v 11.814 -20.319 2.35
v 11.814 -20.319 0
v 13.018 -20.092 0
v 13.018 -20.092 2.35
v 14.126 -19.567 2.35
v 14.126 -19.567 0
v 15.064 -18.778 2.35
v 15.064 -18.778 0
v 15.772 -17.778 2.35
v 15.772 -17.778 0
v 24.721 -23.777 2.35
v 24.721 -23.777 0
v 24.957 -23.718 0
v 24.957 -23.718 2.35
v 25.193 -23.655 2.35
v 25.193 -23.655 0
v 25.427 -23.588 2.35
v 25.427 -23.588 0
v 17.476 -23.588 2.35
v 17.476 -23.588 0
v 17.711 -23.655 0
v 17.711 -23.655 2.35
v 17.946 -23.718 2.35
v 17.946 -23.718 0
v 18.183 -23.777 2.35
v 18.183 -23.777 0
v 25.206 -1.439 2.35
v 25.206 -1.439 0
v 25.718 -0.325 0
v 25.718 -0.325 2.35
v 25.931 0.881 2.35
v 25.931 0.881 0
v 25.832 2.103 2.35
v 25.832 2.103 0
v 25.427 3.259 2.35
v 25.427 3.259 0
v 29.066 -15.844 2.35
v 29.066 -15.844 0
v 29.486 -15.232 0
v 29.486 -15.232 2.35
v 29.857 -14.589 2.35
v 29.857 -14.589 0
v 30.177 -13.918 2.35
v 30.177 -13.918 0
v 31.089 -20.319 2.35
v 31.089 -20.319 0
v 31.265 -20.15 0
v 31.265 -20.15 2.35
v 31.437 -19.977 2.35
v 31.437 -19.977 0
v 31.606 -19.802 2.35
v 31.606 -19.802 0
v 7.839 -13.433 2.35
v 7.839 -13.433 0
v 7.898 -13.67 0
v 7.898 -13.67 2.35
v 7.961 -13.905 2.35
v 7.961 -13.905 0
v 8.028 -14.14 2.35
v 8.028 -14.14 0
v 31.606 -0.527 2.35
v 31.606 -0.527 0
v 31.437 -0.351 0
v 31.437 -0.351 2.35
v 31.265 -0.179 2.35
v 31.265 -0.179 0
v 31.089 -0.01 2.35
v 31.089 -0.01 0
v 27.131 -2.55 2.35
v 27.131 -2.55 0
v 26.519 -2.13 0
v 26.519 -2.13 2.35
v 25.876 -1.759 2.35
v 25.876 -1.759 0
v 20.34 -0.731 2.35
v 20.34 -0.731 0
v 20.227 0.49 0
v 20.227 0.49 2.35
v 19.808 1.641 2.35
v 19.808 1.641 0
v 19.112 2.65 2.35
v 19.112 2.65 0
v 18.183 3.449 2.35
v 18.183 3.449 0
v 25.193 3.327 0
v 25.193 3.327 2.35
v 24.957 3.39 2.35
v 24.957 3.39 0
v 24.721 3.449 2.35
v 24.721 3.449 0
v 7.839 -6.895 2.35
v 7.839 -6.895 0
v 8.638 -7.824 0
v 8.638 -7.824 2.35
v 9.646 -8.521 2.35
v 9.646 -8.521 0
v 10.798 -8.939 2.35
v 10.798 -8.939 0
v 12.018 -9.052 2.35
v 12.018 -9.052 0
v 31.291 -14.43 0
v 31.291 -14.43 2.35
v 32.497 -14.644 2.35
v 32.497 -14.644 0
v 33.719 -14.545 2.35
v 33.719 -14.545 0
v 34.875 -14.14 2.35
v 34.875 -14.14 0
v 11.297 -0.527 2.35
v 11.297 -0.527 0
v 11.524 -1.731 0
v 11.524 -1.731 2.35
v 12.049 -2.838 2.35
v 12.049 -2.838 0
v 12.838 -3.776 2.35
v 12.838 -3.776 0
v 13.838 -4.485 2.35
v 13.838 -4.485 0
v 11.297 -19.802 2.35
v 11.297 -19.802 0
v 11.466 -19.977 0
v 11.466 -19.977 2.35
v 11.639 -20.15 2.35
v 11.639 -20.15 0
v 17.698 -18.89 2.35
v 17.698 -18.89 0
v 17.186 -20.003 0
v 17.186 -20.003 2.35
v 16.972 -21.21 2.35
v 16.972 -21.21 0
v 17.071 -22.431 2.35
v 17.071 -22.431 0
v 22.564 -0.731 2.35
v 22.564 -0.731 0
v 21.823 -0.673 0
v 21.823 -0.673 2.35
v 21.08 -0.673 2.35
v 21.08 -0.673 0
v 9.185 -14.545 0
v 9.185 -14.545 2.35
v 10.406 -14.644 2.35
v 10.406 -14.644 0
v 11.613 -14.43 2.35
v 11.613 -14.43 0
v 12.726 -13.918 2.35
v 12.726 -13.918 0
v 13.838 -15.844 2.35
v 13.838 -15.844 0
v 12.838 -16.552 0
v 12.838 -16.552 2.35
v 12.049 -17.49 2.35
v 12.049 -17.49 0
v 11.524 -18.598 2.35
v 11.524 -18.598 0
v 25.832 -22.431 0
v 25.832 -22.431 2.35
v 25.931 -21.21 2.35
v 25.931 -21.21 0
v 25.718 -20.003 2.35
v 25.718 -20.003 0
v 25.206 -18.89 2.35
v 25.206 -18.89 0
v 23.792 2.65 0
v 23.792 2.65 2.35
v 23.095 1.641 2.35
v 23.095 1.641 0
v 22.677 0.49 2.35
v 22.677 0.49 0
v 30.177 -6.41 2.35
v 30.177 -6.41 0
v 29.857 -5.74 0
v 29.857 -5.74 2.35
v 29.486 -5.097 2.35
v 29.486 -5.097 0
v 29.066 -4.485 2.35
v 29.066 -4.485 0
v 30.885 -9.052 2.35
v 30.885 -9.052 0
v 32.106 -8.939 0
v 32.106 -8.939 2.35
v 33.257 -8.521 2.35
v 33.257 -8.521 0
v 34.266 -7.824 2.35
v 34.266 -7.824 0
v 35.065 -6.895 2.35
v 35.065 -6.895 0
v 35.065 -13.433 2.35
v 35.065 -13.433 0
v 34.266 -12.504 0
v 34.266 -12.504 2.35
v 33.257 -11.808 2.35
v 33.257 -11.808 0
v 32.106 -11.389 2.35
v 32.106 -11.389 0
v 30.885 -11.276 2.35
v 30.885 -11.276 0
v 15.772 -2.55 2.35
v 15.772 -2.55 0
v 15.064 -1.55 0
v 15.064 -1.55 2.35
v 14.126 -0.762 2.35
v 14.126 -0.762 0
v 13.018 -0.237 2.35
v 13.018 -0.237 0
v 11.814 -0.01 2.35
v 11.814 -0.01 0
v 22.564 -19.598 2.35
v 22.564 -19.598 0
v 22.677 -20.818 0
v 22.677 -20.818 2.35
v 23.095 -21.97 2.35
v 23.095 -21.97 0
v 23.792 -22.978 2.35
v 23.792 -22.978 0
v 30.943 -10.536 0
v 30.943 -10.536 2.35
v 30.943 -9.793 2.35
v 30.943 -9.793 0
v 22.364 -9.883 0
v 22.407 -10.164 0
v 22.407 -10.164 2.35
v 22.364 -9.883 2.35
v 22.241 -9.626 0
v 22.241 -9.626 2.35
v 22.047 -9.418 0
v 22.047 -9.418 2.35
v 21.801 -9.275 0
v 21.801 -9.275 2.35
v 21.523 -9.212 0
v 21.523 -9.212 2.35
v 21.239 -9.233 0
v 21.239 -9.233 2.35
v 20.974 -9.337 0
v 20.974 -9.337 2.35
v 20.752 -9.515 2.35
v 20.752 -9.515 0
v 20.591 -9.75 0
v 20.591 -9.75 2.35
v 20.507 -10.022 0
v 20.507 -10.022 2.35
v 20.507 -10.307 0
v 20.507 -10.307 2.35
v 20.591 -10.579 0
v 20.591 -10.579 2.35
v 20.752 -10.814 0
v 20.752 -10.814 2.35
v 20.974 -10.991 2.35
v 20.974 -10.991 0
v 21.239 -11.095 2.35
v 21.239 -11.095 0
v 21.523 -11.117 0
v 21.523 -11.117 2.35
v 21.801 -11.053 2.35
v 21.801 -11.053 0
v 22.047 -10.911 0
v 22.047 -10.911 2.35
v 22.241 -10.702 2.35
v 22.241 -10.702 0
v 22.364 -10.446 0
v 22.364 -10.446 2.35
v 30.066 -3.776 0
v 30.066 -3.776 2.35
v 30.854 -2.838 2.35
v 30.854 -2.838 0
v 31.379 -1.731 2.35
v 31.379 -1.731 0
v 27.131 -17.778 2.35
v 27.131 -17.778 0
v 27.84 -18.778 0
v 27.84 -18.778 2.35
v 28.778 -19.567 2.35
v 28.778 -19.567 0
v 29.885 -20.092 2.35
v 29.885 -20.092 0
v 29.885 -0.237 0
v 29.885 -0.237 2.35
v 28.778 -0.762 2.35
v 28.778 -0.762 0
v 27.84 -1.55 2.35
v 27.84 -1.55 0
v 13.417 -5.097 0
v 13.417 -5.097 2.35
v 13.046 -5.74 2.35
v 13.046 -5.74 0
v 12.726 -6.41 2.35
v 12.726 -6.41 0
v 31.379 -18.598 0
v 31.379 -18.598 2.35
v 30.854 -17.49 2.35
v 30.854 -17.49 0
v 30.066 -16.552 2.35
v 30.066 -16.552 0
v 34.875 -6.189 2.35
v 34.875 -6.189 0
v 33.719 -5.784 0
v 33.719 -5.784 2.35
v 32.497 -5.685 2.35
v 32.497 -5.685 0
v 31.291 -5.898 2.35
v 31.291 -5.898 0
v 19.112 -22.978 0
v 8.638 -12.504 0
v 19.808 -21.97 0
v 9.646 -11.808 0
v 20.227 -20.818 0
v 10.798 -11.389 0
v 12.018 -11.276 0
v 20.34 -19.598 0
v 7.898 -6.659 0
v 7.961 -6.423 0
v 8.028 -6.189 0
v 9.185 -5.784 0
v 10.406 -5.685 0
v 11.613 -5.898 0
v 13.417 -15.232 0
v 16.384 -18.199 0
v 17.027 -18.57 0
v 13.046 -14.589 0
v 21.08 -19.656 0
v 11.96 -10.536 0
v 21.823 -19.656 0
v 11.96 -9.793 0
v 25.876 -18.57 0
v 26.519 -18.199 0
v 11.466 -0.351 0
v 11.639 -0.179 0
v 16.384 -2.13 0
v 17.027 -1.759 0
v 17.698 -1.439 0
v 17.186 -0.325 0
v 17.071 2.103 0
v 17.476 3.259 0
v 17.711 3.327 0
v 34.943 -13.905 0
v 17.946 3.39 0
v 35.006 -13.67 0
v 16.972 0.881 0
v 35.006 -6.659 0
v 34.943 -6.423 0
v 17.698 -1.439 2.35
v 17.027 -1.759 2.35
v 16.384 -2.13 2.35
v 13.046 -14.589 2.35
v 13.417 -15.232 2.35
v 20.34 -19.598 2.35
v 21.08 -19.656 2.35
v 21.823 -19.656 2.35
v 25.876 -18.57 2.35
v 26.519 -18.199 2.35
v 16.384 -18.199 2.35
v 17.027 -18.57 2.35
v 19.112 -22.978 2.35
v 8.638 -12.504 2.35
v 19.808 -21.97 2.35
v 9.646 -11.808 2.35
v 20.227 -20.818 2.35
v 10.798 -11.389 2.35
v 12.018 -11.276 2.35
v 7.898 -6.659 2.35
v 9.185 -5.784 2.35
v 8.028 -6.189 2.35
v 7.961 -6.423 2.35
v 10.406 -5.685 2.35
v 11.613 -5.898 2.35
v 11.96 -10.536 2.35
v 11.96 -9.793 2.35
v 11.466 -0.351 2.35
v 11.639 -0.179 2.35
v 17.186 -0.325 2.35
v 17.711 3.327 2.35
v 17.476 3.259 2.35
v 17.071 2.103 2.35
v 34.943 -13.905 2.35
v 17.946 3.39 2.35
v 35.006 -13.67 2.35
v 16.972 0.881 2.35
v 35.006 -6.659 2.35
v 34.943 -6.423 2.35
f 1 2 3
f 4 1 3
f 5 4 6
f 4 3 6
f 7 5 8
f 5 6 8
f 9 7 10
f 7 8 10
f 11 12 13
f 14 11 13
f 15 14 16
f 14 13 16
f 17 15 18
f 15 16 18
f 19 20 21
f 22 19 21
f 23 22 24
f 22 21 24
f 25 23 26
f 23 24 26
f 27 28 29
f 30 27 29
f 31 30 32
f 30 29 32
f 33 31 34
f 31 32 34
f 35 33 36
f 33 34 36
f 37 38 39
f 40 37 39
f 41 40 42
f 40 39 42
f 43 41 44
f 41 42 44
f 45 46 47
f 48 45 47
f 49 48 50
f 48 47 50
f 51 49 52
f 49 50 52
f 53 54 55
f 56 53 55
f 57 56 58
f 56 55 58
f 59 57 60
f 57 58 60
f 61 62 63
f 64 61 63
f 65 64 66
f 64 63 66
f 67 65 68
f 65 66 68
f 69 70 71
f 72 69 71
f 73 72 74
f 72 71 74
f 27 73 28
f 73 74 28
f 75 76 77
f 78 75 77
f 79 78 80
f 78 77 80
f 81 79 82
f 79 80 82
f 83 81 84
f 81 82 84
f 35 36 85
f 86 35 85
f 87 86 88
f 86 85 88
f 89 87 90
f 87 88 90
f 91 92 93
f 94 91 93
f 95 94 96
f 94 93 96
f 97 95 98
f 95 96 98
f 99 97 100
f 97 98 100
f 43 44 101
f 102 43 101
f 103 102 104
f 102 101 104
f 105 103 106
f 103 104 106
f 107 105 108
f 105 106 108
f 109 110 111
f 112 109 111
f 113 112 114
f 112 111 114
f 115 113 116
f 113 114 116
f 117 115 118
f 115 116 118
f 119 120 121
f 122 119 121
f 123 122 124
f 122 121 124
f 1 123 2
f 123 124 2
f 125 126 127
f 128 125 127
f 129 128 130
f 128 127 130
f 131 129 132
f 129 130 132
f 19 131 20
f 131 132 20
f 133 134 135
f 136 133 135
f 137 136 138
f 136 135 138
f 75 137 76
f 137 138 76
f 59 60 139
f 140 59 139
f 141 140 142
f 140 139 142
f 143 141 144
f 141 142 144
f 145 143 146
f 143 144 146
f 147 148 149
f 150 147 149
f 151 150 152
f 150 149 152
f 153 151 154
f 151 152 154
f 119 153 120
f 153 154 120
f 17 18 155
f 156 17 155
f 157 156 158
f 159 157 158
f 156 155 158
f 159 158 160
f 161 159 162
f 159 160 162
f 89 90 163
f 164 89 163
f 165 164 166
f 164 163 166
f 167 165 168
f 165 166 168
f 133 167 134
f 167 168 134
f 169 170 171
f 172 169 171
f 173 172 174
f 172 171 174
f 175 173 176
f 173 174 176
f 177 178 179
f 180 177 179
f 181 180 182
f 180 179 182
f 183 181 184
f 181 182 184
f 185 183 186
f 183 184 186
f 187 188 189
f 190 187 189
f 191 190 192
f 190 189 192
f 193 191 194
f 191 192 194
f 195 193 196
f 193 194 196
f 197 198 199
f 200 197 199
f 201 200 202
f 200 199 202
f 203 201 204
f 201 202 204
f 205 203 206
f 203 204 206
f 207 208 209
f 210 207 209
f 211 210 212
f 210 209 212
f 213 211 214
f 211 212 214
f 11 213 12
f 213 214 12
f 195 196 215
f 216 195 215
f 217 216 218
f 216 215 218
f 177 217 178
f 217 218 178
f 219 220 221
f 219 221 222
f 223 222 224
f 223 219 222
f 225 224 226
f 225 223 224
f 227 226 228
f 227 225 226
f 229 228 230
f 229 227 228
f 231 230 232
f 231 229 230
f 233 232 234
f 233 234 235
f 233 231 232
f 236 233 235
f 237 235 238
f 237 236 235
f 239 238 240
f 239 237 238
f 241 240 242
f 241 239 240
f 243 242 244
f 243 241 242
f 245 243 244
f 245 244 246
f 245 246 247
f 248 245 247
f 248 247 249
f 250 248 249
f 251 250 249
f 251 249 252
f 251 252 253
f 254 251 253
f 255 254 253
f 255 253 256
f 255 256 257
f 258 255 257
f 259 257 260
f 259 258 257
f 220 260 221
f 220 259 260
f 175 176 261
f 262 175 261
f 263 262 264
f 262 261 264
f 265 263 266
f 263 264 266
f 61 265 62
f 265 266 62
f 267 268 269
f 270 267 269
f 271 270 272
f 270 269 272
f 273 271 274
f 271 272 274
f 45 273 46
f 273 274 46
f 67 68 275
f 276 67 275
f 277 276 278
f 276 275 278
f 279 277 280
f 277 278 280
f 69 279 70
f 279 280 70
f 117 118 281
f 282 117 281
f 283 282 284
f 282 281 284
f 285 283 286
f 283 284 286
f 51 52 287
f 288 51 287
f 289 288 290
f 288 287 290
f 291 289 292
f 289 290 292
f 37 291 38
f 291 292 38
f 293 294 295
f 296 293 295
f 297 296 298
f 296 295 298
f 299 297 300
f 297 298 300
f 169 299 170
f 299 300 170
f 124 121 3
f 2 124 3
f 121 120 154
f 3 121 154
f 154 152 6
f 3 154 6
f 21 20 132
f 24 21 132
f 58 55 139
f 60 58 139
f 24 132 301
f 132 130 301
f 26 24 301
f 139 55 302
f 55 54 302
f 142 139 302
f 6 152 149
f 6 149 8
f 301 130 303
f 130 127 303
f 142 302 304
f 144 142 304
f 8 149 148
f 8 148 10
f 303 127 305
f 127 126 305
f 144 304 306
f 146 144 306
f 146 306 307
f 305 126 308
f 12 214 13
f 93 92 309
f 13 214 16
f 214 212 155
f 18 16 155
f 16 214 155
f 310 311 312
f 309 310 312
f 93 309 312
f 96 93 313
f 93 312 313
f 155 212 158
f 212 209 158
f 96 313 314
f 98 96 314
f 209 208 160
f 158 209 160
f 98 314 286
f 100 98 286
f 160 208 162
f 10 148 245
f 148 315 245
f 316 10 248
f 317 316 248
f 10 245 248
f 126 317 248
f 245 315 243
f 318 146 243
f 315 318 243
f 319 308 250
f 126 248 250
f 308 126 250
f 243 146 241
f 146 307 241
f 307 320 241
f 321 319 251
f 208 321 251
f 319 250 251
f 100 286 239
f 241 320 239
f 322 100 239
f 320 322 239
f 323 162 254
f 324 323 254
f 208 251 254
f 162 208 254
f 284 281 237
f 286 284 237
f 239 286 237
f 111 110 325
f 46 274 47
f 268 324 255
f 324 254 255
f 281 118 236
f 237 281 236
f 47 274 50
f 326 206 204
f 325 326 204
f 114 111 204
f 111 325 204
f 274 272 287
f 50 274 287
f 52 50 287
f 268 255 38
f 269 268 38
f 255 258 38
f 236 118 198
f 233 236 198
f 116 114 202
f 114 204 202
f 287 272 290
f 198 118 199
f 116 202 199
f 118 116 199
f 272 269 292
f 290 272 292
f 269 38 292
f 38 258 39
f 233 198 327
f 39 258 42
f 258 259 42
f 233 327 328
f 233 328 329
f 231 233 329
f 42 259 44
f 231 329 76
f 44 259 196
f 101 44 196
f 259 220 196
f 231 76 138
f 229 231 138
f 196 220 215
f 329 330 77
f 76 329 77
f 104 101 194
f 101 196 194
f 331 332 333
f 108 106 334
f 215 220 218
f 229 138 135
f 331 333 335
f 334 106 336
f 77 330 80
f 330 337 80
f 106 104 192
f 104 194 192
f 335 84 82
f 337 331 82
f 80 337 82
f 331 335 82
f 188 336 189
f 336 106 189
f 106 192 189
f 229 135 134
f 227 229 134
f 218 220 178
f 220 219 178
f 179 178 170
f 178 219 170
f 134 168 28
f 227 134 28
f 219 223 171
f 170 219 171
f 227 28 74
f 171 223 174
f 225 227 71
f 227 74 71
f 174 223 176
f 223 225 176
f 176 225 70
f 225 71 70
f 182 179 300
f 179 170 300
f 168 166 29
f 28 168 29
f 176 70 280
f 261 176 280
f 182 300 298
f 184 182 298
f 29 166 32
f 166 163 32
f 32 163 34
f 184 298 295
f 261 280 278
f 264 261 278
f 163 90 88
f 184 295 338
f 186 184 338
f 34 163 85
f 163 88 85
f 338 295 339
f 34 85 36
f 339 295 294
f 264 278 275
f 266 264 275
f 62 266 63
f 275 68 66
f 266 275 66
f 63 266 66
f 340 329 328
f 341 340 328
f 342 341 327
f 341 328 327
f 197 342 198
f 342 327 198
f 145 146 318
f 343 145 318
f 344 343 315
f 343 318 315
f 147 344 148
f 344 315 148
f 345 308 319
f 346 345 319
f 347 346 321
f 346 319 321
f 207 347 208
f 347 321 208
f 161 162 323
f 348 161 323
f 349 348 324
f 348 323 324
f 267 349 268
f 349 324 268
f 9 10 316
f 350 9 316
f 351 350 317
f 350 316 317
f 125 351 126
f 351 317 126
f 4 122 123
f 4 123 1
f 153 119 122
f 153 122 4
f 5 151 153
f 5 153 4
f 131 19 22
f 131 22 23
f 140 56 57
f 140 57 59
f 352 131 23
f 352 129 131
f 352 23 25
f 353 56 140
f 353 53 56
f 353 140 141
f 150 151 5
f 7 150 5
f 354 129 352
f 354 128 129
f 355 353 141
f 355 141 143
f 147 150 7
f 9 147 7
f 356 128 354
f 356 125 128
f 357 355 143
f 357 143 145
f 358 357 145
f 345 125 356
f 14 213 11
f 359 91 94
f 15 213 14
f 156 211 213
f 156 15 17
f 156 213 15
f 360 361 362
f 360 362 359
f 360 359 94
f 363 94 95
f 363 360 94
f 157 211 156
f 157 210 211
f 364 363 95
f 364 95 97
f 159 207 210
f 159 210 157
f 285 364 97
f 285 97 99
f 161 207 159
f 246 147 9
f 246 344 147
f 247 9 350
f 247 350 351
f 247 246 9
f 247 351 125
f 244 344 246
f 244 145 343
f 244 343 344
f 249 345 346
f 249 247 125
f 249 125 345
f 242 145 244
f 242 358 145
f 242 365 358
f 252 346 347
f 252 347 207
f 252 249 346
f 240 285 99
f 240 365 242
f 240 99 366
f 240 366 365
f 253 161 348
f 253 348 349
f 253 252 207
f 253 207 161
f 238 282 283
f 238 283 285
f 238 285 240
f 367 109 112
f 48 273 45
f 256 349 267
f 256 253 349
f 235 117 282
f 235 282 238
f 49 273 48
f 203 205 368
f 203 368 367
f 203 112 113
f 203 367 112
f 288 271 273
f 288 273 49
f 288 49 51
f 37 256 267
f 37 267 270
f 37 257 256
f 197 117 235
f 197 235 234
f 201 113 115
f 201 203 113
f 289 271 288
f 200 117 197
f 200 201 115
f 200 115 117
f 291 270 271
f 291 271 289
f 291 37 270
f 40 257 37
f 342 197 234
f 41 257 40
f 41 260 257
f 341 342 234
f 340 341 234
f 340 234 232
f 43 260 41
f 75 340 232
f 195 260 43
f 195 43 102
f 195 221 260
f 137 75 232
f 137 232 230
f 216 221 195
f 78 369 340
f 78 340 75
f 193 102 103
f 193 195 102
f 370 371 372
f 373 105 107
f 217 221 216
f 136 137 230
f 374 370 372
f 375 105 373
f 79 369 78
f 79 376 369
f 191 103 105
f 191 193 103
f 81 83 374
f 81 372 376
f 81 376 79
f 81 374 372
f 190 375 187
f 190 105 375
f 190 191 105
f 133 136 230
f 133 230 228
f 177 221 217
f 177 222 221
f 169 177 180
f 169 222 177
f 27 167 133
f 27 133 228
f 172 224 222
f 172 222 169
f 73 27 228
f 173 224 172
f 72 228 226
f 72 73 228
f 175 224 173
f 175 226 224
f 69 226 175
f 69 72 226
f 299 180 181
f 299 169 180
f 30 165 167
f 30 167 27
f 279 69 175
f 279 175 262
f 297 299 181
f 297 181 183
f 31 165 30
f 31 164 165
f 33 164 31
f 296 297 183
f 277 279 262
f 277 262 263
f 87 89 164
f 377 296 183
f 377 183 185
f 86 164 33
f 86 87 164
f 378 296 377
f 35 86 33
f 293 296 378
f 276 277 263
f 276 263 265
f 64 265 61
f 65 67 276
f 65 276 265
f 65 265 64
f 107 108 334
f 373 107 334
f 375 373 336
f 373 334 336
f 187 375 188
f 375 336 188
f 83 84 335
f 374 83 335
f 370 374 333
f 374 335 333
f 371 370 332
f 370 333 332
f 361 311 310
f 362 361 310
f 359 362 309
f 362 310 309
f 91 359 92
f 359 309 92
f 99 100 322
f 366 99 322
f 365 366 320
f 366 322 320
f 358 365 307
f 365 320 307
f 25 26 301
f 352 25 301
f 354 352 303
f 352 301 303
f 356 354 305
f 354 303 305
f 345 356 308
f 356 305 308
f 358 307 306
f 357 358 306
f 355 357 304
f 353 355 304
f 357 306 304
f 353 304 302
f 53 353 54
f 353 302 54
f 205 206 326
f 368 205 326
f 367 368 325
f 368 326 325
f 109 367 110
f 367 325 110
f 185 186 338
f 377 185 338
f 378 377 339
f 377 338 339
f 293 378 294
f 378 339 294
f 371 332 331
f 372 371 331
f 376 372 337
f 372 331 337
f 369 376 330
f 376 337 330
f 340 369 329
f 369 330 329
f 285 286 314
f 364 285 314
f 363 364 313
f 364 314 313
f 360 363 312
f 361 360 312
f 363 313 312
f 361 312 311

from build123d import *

# Parameters (mm, degrees)
SKETCH1_R           = 0.955
BOSS_EXTRUDE1_DEPTH = 2.35


with BuildPart() as part:
    # Sketch1 → Boss-Extrude1 (new body)
    with BuildSketch(Plane.XY):
        with BuildLine():
            ThreePointArc((31.089190509, -0.00961289), (28.777823425, -0.762116774), (27.131493603, -2.550489779))
            ThreePointArc((27.131493603, -2.550489779), (26.201203233, -1.937982234), (25.205610954, -1.438580913))
            ThreePointArc((25.205610954, -1.438580913), (25.931222497, 0.881369039), (25.427226435, 3.259323592))
            ThreePointArc((25.427226435, 3.259323592), (25.075169864, 3.358604023), (24.720639715, 3.448652933))
            ThreePointArc((24.720639715, 3.448652933), (23.095189045, 1.641281911), (22.563612099, -0.730659454))
            ThreePointArc((22.563612099, -0.730659454), (21.451703233, -0.665357545), (20.339794367, -0.730659454))
            ThreePointArc((20.339794367, -0.730659454), (19.80821742, 1.641281911), (18.182766751, 3.448652933))
            ThreePointArc((18.182766751, 3.448652933), (17.828236601, 3.358604023), (17.47618003, 3.259323592))
            ThreePointArc((17.47618003, 3.259323592), (16.972183969, 0.881369039), (17.697795512, -1.438580913))
            ThreePointArc((17.697795512, -1.438580913), (16.702203233, -1.937982234), (15.771912863, -2.550489779))
            ThreePointArc((15.771912863, -2.550489779), (14.12558304, -0.762116774), (11.814215957, -0.00961289))
            ThreePointArc((11.814215957, -0.00961289), (11.552208296, -0.264862608), (11.296958578, -0.526870269))
            ThreePointArc((11.296958578, -0.526870269), (12.049462462, -2.838237352), (13.837835467, -4.484567174))
            ThreePointArc((13.837835467, -4.484567174), (13.225327922, -5.414857545), (12.725926601, -6.410449824))
            ThreePointArc((12.725926601, -6.410449824), (10.40597665, -5.684838281), (8.028022096, -6.188834342))
            ThreePointArc((8.028022096, -6.188834342), (7.928741665, -6.540890913), (7.838692755, -6.895421063))
            ThreePointArc((7.838692755, -6.895421063), (9.646063777, -8.520871732), (12.018005142, -9.052448679))
            ThreePointArc((12.018005142, -9.052448679), (11.952703233, -10.164357545), (12.018005142, -11.276266411))
            ThreePointArc((12.018005142, -11.276266411), (9.646063777, -11.807843357), (7.838692755, -13.433294027))
            ThreePointArc((7.838692755, -13.433294027), (7.928741665, -13.787824176), (8.028022096, -14.139880747))
            ThreePointArc((8.028022096, -14.139880747), (10.40597665, -14.643876808), (12.725926601, -13.918265265))
            ThreePointArc((12.725926601, -13.918265265), (13.225327922, -14.913857545), (13.837835467, -15.844147915))
            ThreePointArc((13.837835467, -15.844147915), (12.049462462, -17.490477737), (11.296958578, -19.80184482))
            ThreePointArc((11.296958578, -19.80184482), (11.552208296, -20.063852481), (11.814215957, -20.3191022))
            ThreePointArc((11.814215957, -20.3191022), (14.12558304, -19.566598315), (15.771912863, -17.77822531))
            ThreePointArc((15.771912863, -17.77822531), (16.702203233, -18.390732855), (17.697795512, -18.890134176))
            ThreePointArc((17.697795512, -18.890134176), (16.972183969, -21.210084128), (17.47618003, -23.588038682))
            ThreePointArc((17.47618003, -23.588038682), (17.828236601, -23.687319113), (18.182766751, -23.777368023))
            ThreePointArc((18.182766751, -23.777368023), (19.80821742, -21.969997001), (20.339794367, -19.598055636))
            ThreePointArc((20.339794367, -19.598055636), (21.451703233, -19.663357545), (22.563612099, -19.598055636))
            ThreePointArc((22.563612099, -19.598055636), (23.095189045, -21.969997001), (24.720639715, -23.777368023))
            ThreePointArc((24.720639715, -23.777368023), (25.075169864, -23.687319113), (25.427226435, -23.588038682))
            ThreePointArc((25.427226435, -23.588038682), (25.931222497, -21.210084128), (25.205610954, -18.890134176))
            ThreePointArc((25.205610954, -18.890134176), (26.201203233, -18.390732855), (27.131493603, -17.77822531))
            ThreePointArc((27.131493603, -17.77822531), (28.777823425, -19.566598315), (31.089190509, -20.3191022))
            ThreePointArc((31.089190509, -20.3191022), (31.351198169, -20.063852481), (31.606447888, -19.80184482))
            ThreePointArc((31.606447888, -19.80184482), (30.853944004, -17.490477737), (29.065570998, -15.844147915))
            ThreePointArc((29.065570998, -15.844147915), (29.678078543, -14.913857545), (30.177479864, -13.918265265))
            ThreePointArc((30.177479864, -13.918265265), (32.497429816, -14.643876808), (34.87538437, -14.139880747))
            ThreePointArc((34.87538437, -14.139880747), (34.974664801, -13.787824176), (35.064713711, -13.433294027))
            ThreePointArc((35.064713711, -13.433294027), (33.257342689, -11.807843357), (30.885401324, -11.276266411))
            ThreePointArc((30.885401324, -11.276266411), (30.950703233, -10.164357545), (30.885401324, -9.052448679))
            ThreePointArc((30.885401324, -9.052448679), (33.257342689, -8.520871732), (35.064713711, -6.895421063))
            ThreePointArc((35.064713711, -6.895421063), (34.974664801, -6.540890913), (34.87538437, -6.188834342))
            ThreePointArc((34.87538437, -6.188834342), (32.497429816, -5.684838281), (30.177479864, -6.410449824))
            ThreePointArc((30.177479864, -6.410449824), (29.678078543, -5.414857545), (29.065570998, -4.484567174))
            ThreePointArc((29.065570998, -4.484567174), (30.853944004, -2.838237352), (31.606447888, -0.526870269))
            ThreePointArc((31.606447888, -0.526870269), (31.351198169, -0.264862608), (31.089190509, -0.00961289))
        make_face()
        with Locations((21.451703233, -10.164357545)):
            Circle(SKETCH1_R, mode=Mode.SUBTRACT)
    extrude(amount=BOSS_EXTRUDE1_DEPTH)


solid = part.part
